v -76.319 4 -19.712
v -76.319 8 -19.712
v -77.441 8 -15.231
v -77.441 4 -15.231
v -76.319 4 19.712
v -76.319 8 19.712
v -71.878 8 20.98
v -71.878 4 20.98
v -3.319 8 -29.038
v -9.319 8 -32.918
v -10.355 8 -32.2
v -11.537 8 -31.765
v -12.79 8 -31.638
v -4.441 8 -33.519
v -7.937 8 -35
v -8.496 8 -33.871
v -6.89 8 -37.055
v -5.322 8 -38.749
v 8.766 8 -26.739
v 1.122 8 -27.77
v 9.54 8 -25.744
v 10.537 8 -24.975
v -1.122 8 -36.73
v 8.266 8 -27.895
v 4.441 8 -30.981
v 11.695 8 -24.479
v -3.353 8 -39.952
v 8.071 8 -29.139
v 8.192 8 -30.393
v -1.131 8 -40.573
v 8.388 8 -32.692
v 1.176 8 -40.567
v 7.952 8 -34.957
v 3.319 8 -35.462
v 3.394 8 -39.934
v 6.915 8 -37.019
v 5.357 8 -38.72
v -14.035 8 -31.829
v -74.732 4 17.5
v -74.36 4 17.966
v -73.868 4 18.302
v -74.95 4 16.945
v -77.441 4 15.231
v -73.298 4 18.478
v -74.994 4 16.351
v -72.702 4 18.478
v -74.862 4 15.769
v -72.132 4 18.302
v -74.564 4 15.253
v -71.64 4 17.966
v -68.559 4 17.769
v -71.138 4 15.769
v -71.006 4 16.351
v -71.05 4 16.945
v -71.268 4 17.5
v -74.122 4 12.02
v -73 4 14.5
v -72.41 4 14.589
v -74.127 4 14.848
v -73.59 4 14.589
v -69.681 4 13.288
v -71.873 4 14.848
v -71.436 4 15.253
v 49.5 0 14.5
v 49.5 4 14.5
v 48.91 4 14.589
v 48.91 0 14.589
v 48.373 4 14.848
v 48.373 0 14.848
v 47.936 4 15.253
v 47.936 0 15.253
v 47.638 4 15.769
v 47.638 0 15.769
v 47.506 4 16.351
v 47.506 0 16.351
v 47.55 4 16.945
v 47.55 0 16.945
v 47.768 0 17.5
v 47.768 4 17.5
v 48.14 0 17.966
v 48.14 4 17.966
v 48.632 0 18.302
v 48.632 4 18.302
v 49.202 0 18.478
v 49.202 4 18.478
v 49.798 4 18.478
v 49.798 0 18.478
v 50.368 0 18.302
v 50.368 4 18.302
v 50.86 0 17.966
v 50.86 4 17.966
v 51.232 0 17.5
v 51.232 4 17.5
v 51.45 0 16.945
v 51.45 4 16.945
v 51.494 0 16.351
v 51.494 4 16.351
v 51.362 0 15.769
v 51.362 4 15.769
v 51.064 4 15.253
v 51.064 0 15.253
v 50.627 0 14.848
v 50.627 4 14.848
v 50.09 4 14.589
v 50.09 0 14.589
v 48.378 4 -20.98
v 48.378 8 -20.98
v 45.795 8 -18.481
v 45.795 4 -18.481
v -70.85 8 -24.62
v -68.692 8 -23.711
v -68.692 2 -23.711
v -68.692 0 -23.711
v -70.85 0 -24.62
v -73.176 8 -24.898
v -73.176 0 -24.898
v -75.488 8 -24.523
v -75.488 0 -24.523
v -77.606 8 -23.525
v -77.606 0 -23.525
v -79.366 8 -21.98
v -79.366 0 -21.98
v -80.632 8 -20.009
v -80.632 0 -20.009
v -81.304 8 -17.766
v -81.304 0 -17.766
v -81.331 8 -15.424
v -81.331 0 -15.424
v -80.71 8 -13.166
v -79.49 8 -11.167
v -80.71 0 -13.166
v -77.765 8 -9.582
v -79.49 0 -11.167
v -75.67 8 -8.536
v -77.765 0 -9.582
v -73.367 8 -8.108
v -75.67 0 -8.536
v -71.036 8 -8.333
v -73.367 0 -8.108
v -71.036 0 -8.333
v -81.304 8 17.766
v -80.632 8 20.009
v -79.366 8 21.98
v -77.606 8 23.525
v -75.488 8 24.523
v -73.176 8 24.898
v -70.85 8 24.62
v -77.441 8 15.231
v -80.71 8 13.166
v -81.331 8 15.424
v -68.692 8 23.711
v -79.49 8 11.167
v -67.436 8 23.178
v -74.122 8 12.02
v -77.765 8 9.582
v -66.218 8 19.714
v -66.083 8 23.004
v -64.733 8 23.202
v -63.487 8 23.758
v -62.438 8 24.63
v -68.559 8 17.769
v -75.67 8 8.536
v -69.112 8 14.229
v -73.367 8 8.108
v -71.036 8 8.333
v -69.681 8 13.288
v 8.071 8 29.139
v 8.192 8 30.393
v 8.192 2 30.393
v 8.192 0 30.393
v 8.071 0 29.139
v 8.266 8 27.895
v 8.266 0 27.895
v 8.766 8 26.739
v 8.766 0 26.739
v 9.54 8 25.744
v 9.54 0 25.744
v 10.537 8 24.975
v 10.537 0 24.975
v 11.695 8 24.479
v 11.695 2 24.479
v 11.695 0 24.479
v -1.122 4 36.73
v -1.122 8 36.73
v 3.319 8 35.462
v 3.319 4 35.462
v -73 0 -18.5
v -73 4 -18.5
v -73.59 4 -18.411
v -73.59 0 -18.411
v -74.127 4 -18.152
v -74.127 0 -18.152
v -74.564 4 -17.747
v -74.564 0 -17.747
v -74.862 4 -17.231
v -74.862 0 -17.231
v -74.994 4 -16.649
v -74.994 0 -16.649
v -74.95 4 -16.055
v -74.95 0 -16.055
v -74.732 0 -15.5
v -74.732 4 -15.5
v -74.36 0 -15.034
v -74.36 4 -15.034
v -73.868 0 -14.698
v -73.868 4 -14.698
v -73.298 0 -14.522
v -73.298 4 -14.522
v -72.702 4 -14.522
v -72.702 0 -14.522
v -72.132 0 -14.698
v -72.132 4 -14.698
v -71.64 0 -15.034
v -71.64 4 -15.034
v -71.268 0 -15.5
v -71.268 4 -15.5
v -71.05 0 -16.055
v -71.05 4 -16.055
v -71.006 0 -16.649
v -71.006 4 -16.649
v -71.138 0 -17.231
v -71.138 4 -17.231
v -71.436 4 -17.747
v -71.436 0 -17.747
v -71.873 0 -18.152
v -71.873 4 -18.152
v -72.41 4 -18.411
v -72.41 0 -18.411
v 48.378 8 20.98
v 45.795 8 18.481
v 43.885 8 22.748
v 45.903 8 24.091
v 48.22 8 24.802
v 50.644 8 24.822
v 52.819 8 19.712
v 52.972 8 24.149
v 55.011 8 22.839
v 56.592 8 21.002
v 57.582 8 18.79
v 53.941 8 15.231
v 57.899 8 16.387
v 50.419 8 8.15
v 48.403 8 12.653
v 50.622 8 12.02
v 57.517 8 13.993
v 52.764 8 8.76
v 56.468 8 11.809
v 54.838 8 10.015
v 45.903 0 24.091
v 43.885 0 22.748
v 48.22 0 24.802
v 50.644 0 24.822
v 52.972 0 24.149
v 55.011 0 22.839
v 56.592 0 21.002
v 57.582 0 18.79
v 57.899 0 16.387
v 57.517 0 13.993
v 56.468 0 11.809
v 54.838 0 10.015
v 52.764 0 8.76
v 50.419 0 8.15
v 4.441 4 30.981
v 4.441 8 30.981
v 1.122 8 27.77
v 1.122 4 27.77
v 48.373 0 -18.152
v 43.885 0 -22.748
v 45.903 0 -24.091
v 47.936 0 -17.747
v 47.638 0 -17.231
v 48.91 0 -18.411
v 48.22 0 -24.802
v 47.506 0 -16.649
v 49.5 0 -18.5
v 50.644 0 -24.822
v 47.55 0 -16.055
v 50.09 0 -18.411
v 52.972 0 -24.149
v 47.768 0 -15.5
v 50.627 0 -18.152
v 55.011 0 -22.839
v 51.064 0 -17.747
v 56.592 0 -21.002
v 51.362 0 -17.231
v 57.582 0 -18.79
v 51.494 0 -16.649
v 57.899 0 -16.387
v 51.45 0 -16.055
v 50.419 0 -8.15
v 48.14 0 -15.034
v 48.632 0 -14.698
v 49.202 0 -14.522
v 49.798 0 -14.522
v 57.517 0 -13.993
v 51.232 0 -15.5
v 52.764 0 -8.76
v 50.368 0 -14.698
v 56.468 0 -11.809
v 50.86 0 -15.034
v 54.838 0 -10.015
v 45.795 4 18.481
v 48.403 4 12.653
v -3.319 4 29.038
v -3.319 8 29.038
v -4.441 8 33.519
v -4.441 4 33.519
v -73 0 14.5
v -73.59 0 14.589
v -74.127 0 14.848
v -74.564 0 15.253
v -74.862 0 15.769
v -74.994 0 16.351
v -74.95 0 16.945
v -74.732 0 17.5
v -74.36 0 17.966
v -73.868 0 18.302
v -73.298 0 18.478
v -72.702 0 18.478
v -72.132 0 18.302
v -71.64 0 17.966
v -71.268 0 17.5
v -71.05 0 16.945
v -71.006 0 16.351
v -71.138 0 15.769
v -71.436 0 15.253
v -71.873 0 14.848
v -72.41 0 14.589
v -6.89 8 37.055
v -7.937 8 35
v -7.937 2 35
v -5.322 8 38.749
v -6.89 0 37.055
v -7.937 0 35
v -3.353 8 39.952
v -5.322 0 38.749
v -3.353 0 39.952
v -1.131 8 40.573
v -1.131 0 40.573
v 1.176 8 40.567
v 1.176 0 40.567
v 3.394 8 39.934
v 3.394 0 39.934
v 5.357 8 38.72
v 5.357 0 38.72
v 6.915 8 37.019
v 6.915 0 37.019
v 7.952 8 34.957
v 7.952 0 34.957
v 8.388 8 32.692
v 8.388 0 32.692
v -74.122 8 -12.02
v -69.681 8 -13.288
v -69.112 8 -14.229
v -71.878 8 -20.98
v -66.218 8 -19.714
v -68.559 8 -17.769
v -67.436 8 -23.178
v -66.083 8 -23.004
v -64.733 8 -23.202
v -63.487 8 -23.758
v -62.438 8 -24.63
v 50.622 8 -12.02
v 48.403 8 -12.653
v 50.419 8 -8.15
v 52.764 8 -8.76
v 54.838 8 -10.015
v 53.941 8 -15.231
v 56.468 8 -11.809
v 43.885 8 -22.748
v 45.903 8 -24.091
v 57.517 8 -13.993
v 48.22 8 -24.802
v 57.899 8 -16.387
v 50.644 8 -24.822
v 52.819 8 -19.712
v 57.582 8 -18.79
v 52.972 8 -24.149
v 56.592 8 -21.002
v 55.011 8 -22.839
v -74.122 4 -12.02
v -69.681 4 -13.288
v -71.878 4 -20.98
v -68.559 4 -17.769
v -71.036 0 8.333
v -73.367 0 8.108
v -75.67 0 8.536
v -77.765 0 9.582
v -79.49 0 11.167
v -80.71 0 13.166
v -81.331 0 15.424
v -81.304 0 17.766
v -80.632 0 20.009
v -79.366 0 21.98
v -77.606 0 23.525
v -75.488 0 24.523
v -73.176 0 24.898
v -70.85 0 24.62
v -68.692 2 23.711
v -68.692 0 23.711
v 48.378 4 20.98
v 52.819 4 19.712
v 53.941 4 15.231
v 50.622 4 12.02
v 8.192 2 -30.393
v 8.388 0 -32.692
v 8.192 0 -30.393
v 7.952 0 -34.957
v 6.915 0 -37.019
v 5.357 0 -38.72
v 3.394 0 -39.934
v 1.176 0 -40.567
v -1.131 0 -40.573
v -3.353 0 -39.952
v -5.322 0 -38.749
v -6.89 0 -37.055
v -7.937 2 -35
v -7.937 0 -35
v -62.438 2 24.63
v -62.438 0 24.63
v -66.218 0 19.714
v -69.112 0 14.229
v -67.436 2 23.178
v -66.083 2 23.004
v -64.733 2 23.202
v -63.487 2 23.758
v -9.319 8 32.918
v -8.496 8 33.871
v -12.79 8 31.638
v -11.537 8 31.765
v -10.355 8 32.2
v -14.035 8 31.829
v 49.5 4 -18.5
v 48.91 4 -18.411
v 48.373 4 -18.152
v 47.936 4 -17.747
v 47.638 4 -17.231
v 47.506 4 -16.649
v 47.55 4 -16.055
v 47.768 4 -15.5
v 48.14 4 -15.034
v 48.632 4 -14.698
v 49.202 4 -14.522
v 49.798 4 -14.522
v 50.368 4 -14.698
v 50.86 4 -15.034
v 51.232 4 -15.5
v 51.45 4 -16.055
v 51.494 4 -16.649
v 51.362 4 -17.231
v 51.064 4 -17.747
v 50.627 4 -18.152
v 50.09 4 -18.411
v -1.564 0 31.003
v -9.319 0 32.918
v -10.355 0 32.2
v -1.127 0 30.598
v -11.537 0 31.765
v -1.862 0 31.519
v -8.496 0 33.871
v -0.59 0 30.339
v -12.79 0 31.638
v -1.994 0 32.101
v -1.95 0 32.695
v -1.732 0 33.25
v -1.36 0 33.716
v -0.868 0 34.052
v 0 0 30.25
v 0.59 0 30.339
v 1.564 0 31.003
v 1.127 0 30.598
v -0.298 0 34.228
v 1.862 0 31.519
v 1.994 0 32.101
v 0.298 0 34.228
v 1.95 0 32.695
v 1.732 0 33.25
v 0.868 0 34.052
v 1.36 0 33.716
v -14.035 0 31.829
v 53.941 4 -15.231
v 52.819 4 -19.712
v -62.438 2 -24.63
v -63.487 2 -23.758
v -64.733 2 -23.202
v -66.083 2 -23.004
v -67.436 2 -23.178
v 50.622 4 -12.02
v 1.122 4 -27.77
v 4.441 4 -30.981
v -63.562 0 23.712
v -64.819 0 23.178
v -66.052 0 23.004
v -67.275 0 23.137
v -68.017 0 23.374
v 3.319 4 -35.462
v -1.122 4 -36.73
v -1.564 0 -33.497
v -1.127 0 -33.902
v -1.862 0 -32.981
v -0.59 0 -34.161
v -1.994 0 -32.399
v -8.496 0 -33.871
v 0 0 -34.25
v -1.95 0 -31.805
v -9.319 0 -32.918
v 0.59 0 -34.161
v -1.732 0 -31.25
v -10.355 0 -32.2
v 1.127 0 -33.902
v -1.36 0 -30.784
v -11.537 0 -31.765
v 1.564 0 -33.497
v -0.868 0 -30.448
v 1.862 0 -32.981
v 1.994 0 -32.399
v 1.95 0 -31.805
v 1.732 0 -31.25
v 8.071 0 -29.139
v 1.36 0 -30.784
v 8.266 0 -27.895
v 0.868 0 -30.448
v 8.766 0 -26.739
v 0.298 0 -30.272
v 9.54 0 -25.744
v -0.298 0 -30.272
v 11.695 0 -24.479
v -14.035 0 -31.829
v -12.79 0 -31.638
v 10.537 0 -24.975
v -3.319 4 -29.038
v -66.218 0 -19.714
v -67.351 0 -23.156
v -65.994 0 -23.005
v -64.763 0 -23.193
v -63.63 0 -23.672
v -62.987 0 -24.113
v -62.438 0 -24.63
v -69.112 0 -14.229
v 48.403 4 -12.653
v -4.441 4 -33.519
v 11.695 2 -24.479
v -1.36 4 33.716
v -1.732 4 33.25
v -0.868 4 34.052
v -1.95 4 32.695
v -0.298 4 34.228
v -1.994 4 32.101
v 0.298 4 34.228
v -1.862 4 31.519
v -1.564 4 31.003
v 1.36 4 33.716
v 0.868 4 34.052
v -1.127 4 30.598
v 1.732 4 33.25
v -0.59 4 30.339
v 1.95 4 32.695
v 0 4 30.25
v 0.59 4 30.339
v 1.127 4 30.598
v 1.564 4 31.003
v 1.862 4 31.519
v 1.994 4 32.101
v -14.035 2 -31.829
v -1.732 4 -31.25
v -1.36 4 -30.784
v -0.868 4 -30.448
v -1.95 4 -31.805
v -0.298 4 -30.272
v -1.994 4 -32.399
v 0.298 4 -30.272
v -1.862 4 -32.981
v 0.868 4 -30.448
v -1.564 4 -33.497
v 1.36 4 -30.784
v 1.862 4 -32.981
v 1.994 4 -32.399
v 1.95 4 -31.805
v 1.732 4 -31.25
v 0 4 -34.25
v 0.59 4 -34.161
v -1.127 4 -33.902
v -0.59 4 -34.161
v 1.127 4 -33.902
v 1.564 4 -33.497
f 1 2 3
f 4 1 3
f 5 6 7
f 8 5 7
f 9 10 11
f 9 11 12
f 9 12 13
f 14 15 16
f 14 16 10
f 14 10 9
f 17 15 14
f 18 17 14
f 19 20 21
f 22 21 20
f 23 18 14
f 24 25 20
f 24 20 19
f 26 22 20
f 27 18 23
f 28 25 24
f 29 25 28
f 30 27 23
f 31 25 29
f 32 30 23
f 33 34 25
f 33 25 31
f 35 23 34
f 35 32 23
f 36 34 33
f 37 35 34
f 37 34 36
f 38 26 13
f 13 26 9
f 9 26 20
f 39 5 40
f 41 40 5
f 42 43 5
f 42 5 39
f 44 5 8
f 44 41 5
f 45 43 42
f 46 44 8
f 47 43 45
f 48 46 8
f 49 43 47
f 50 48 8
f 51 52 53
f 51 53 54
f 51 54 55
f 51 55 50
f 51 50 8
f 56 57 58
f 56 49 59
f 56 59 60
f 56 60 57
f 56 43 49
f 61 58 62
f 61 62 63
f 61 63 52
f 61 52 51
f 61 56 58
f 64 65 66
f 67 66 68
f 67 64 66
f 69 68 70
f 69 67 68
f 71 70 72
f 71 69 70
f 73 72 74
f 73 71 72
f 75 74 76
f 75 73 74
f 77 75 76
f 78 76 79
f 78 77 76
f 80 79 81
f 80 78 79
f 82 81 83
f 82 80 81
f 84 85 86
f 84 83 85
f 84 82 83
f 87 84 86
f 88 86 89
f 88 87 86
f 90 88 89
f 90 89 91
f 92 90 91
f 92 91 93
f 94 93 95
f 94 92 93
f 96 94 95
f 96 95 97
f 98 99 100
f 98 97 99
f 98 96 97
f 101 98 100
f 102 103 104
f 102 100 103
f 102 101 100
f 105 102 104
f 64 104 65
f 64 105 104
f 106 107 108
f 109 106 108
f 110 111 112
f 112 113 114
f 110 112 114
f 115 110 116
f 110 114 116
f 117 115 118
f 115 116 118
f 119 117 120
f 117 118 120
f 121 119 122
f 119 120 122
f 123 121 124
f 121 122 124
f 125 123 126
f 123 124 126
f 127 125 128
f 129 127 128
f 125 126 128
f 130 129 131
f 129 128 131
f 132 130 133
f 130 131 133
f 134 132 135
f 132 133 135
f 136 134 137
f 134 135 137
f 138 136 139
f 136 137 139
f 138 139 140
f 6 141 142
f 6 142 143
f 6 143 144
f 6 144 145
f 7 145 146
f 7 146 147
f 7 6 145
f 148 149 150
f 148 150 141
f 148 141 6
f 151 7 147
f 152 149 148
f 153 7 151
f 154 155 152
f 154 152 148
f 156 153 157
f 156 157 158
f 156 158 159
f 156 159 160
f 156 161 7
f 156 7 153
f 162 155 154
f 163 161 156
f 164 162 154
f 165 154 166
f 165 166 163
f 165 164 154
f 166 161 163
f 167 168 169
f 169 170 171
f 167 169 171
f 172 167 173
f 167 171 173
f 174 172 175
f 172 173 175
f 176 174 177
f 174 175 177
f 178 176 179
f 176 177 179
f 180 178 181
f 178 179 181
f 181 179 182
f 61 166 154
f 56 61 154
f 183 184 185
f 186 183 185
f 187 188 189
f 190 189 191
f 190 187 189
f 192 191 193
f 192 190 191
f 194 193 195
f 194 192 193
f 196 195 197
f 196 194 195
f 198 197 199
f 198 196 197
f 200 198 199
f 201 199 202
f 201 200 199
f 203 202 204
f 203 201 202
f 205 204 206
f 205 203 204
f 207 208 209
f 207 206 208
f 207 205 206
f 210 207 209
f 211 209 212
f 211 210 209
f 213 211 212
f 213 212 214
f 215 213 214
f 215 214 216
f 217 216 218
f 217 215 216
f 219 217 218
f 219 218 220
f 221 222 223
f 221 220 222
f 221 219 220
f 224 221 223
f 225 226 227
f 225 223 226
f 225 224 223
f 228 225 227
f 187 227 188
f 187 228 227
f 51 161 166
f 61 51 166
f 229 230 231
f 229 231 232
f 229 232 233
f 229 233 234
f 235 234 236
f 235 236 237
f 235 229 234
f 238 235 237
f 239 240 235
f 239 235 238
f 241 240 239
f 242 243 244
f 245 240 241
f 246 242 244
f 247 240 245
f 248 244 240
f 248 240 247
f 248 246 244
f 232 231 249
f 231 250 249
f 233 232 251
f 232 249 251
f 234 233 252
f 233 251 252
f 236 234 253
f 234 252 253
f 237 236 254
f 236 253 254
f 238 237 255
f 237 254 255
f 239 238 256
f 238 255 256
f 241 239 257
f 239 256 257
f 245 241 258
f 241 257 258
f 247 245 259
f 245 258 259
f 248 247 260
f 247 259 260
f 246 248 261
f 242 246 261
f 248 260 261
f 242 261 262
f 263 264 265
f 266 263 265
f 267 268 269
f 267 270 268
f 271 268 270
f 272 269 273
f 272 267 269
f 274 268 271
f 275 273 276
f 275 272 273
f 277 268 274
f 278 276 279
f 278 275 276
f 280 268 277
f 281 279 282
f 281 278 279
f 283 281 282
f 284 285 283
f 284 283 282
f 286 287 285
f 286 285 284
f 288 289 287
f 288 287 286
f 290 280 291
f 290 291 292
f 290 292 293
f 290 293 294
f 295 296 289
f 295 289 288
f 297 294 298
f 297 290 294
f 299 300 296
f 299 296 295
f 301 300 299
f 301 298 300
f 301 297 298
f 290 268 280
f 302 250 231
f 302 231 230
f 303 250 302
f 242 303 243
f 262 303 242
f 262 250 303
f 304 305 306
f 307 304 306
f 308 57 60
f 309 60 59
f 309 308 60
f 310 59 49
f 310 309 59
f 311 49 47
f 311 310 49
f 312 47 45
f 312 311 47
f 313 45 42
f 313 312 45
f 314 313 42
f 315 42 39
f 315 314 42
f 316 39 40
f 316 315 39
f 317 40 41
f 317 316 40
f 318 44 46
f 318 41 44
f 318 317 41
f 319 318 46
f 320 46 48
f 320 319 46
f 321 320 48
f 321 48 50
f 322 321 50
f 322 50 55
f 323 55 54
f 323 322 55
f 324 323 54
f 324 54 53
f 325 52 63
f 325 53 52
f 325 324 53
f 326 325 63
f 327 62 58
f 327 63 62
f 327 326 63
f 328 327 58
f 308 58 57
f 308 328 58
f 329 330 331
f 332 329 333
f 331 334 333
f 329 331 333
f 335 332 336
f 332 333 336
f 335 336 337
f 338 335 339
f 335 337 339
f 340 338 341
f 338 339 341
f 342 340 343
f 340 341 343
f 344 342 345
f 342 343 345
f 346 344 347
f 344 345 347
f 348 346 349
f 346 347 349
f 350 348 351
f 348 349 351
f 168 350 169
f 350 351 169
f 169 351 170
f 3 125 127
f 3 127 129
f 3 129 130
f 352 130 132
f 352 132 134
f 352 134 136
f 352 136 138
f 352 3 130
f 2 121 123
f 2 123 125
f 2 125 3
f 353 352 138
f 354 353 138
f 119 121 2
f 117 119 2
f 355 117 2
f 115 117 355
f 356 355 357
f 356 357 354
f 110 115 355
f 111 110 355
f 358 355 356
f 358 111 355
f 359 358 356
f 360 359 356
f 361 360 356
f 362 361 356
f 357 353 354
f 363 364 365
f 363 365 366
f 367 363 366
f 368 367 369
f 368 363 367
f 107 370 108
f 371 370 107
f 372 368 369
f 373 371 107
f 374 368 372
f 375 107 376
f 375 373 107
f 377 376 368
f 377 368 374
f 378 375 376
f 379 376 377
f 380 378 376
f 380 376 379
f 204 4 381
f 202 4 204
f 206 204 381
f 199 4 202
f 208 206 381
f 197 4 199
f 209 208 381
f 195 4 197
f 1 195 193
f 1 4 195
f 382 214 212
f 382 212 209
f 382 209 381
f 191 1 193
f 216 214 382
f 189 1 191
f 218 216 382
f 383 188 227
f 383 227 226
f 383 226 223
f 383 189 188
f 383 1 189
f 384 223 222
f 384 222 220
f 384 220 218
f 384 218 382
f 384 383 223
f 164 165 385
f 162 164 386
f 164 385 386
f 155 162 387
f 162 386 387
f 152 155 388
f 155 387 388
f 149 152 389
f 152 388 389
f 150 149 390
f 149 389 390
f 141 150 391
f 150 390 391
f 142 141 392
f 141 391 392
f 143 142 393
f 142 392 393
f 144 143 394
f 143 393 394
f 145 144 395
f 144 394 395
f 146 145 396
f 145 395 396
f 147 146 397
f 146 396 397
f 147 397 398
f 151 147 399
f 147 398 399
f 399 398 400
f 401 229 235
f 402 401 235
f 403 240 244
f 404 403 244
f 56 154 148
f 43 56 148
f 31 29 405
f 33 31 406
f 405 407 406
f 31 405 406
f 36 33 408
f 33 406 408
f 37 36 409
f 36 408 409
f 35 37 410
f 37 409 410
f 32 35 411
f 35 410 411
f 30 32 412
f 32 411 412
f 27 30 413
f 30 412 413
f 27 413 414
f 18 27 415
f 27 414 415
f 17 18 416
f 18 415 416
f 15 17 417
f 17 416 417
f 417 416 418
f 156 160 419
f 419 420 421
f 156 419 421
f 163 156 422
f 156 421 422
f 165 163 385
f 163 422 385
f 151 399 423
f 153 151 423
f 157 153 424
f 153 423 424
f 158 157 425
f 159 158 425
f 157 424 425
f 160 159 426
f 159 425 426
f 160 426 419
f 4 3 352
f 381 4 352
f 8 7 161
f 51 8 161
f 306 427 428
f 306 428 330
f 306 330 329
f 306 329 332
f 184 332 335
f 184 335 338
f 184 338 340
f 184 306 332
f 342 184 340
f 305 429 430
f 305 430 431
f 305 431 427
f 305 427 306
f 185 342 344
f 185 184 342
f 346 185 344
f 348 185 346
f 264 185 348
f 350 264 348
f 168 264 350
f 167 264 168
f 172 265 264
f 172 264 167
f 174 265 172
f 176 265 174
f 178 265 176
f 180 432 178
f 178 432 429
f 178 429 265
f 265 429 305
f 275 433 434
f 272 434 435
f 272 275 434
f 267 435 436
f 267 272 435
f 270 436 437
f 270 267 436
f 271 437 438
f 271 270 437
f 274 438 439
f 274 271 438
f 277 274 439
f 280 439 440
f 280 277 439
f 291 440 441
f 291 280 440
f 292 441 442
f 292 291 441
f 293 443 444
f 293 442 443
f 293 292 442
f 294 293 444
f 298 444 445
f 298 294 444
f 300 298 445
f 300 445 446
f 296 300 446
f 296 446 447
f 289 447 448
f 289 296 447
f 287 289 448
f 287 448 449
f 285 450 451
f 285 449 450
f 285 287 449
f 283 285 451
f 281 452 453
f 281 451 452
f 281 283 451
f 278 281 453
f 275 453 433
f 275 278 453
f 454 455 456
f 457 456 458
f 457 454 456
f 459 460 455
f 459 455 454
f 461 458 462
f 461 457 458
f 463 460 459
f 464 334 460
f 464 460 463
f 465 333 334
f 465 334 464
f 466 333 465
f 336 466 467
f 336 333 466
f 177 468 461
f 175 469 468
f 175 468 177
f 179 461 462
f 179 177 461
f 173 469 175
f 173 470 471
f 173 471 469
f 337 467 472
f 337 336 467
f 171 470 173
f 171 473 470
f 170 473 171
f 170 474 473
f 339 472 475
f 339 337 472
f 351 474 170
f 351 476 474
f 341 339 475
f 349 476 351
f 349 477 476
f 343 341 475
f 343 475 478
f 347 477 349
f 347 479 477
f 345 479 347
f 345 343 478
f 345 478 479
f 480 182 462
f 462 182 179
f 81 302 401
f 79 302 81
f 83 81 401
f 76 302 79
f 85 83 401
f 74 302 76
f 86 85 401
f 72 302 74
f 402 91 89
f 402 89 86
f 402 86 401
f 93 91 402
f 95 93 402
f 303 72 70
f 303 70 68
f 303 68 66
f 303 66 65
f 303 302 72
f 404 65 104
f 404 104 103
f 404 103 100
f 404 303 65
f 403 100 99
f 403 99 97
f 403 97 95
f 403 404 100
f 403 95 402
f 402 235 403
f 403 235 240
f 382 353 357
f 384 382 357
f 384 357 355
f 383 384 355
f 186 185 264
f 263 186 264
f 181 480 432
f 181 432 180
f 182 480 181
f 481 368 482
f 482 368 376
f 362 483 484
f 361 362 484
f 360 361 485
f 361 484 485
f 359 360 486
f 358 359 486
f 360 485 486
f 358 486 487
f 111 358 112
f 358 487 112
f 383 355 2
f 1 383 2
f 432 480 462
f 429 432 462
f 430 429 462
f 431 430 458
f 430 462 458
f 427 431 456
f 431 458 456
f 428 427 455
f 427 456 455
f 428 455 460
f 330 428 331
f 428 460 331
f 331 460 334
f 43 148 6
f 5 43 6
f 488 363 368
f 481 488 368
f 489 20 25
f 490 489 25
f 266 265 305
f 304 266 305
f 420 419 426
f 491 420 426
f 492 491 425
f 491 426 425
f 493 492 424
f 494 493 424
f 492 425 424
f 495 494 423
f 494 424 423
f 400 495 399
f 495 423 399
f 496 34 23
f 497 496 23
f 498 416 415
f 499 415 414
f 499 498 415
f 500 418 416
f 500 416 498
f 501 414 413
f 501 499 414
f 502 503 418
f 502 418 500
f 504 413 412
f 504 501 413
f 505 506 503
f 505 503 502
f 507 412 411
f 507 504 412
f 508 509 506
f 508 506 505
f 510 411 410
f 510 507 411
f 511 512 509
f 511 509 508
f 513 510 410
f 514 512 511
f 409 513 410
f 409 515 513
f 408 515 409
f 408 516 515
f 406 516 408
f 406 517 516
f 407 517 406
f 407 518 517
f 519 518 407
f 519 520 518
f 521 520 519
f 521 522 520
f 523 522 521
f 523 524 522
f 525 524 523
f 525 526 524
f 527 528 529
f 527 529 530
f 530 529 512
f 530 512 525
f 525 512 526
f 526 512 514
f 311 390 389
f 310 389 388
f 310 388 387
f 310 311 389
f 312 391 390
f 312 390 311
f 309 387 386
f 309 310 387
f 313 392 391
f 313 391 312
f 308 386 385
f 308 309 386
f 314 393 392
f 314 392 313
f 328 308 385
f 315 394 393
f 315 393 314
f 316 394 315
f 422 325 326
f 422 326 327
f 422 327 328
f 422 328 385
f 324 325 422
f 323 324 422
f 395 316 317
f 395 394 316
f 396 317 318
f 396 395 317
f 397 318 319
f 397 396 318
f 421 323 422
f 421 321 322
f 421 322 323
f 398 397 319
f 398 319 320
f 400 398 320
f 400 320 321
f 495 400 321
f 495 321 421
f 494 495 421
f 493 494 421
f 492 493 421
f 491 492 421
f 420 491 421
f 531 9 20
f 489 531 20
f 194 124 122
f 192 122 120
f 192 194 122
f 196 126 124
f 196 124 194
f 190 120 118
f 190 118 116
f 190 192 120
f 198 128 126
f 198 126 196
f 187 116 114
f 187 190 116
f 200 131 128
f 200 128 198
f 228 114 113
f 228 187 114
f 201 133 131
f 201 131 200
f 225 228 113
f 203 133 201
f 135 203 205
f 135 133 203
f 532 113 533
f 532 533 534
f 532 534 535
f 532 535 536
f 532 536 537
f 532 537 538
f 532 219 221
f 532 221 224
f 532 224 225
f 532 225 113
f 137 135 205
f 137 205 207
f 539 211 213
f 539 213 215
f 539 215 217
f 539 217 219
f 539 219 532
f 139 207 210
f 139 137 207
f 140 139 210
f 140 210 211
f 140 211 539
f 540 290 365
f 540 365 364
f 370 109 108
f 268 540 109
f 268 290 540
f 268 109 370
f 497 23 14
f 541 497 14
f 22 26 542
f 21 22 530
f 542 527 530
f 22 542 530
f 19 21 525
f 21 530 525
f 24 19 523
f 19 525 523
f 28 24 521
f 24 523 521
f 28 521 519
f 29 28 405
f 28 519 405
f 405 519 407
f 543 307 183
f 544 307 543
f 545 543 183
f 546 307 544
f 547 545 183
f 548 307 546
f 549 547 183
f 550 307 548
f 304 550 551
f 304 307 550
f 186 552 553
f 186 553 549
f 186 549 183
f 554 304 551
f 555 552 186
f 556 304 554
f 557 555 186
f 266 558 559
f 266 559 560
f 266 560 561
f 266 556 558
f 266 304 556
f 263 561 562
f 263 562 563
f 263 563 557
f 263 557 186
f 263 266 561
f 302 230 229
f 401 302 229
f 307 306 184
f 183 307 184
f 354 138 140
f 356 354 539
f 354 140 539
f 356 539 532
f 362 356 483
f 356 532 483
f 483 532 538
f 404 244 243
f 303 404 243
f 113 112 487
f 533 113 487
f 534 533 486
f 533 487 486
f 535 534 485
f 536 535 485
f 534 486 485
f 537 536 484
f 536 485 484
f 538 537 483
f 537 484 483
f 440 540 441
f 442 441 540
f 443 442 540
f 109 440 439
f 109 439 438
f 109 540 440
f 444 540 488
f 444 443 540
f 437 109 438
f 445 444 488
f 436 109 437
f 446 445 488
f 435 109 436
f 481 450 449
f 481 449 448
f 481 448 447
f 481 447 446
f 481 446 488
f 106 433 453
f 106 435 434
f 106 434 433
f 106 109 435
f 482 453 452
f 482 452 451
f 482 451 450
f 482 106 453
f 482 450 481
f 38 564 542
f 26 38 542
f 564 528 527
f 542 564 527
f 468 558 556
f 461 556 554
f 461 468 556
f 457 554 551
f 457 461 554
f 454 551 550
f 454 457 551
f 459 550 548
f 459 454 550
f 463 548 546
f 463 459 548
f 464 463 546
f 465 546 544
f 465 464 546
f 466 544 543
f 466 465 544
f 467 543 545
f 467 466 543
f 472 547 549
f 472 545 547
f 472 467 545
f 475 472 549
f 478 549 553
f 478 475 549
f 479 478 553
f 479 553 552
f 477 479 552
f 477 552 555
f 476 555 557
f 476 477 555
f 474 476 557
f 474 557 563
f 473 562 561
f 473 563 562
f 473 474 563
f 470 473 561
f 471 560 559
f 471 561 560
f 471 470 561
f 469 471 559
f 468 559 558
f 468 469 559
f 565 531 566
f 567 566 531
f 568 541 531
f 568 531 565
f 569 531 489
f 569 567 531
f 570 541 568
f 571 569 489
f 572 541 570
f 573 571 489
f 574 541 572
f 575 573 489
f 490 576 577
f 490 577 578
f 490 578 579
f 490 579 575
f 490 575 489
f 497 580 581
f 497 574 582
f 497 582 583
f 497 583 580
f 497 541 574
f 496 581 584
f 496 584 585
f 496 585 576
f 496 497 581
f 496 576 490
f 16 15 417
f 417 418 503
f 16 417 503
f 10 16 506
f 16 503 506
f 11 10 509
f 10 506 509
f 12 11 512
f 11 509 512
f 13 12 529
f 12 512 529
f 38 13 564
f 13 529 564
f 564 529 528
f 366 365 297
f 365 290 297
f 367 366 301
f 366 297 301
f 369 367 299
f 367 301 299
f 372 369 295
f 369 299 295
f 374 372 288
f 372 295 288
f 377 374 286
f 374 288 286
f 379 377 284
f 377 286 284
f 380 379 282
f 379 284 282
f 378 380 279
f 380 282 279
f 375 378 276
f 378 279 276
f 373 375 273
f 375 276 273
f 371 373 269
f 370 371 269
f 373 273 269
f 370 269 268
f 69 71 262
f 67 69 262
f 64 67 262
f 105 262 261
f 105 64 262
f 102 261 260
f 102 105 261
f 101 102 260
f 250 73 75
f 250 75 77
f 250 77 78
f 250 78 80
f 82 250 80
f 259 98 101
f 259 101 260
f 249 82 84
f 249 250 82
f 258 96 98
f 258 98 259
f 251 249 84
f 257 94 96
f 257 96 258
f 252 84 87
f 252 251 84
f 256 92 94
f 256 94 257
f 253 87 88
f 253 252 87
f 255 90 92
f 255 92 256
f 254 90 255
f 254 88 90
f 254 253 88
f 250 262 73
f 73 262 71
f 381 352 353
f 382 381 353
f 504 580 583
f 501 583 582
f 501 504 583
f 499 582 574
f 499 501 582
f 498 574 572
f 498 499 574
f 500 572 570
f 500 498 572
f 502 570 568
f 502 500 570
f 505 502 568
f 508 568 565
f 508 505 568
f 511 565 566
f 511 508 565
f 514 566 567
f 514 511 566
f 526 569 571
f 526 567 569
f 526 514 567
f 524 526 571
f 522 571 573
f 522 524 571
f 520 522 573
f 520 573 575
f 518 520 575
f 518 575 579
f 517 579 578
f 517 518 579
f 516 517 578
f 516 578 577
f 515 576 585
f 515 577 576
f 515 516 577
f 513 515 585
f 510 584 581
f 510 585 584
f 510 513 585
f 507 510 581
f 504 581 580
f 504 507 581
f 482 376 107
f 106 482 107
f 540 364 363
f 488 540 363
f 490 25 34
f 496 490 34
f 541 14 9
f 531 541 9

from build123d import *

# Parameters (mm, degrees)
SKETCH1_W               = 200
SKETCH1_H               = 150
SKETCH1_R               = 6
SKETCH1_R_2             = 13.5
SKETCH1_R_3             = 2
SKETCH1_R_4             = 2.5
BOSS_EXTRUDE1_DEPTH     = 4
SKETCH3_W               = 200
SKETCH3_H               = 150
BOSS_EXTRUDE2_DEPTH     = 8.25
SKETCH6_R               = 5.4
CUT_EXTRUDE2_DEPTH      = 8.25
FILLET1_R               = 2.5
FILLET2_R               = 5
SKETCH2_R               = 4.4
SKETCH2_R_2             = 5.4
CUT_EXTRUDE1_DEPTH      = 2
CUT_EXTRUDE3_DEPTH      = 126.598815828
CUT_EXTRUDE3_DEPTH_BACK = 126.598815828
SKETCH8_R               = 2
CUT_EXTRUDE6_DEPTH      = 126.598815818
CUT_EXTRUDE6_DEPTH_BACK = 126.598815818
SKETCH13_OUTSIDE_W      = 252.06
SKETCH13_OUTSIDE_H      = 202.06
FILLET4_R               = 5
CUT_EXTRUDE7_START      = -10.25
CUT_EXTRUDE7_DEPTH      = 10.25
SKETCH17_R              = 2
BOSS_EXTRUDE3_DEPTH     = 2
SKETCH18_R              = 13.5
SKETCH18_R_2            = 2
SKETCH18_R_3            = 2.5
SKETCH18_R_4            = 6
BOSS_EXTRUDE4_DEPTH     = 6
CUT_EXTRUDE8_DEPTH      = 92.336643939
CUT_EXTRUDE8_DEPTH_BACK = 92.336643939
SKETCH19_R              = 19.5
SKETCH19_R_2            = 0.75
CUT_EXTRUDE9_DEPTH      = 4
CUT_EXTRUDE10_DEPTH     = 4
SKETCH22_OUTSIDE_W      = 173.598
SKETCH22_OUTSIDE_H      = 115.598
CUT_EXTRUDE12_DEPTH     = 10


with BuildPart() as part:
    # Sketch1 → Boss-Extrude1 (new body)
    with BuildSketch(Plane(origin=(0, 0, 0), x_dir=(1, 0, 0), z_dir=(0, 1, 0))):
        Rectangle(SKETCH1_W, SKETCH1_H)
        with Locations(Location((35.5, 0, 0), (0, 0, 270))):
            Circle(SKETCH1_R, mode=Mode.SUBTRACT)
        with Locations(Location((-35.5, 0, 0), (0, 0, 270))):
            Circle(SKETCH1_R_2, mode=Mode.SUBTRACT)
        with Locations(Location((-60.5, 0, 0), (0, 0, 270))):
            Circle(SKETCH1_R_3, mode=Mode.SUBTRACT)
        with Locations(Location((-35.5, 25, 0), (0, 0, 270))):
            Circle(SKETCH1_R_3, mode=Mode.SUBTRACT)
        with Locations(Location((-10.5, 0, 0), (0, 0, 270))):
            Circle(SKETCH1_R_3, mode=Mode.SUBTRACT)
        with Locations(Location((-35.5, -25, 0), (0, 0, 270))):
            Circle(SKETCH1_R_3, mode=Mode.SUBTRACT)
        with Locations(Location((35.5, 18.5, 0), (0, 0, 270))):
            Circle(SKETCH1_R_4, mode=Mode.SUBTRACT)
        with Locations(Location((35.5, -18.5, 0), (0, 0, 90))):
            Circle(SKETCH1_R_4, mode=Mode.SUBTRACT)
        Polygon((4.517711304, -15.136418767), (0.159242352, 0.258507293), (4.681501882, 1.538807548), (9.039970835, -13.856118512), (9.584779454, -15.78048427), (5.062519924, -17.060784524), align=None, mode=Mode.SUBTRACT)
    extrude(amount=BOSS_EXTRUDE1_DEPTH)

    # Sketch3 → Boss-Extrude2 (add)
    with BuildSketch(Plane(origin=(0, 4, 0), x_dir=(1, 0, 0), z_dir=(0, 1, 0))):
        Rectangle(SKETCH3_W, SKETCH3_H)
        with BuildLine():
            Line((-26.573943662, 31.250208291), (39.070422535, 12.500083317))
            ThreePointArc((39.070422535, 12.500083317), (48.5, 0), (39.070422535, -12.500083317))
            Line((39.070422535, -12.500083317), (-26.573943662, -31.250208291))
            ThreePointArc((-26.573943662, -31.250208291), (-68, 0), (-26.573943662, 31.250208291))
        make_face(mode=Mode.SUBTRACT)
    extrude(amount=BOSS_EXTRUDE2_DEPTH)

    # Sketch6 → Cut-Extrude2 (cut)
    with BuildSketch(Plane(origin=(0, 12.25, 0), x_dir=(1, 0, 0), z_dir=(0, 1, 0))):
        with Locations((35.5, 18.5)):
            Circle(SKETCH6_R)
        with Locations((35.5, -18.5)):
            Circle(SKETCH6_R)
    extrude(amount=-CUT_EXTRUDE2_DEPTH, mode=Mode.SUBTRACT)

    # Fillet1
    # the kernel refuses this fillet: 2.5 mm, written as the material it adds along each edge
    with BuildSketch(Plane(origin=(9.584779454, 0, 15.78048427), x_dir=(-0.9621828787440704, 0, 0.2724043095323078), z_dir=(0, 1, 0)), Plane(origin=(5.062519924, 0, 17.060784524), x_dir=(-0.2724043095323296, 0, -0.9621828787440644), z_dir=(0, 1, 0)), Plane(origin=(4.681501882, 0, -1.538807548), x_dir=(0.2724043095323091, 0, 0.96218287874407), z_dir=(0, 1, 0))) as fillet1_piece_1:
        with BuildLine():
            CenterArc((FILLET1_R, -FILLET1_R), FILLET1_R, 90, 90)
            Line((0, -FILLET1_R), (0, 0))
            Line((0, 0), (FILLET1_R, 0))
        make_face()
    extrude(amount=4)
    with BuildSketch(Plane(origin=(0.159242352, 0, -0.258507293), x_dir=(0.272404309532306, 0, 0.962182878744071), z_dir=(0, 1, 0))) as fillet1_piece_2:
        with BuildLine():
            CenterArc((FILLET1_R, FILLET1_R), FILLET1_R, 180, 90)
            Line((0, FILLET1_R), (0, 0))
            Line((0, 0), (FILLET1_R, 0))
        make_face()
    extrude(amount=4)

    # Fillet2
    fillet2_edges = [part.edges().sort_by_distance(p)[0] for p in [
        (31.784909874, 8.125, 14.581058133),
        (36.584743308, 8.125, 13.210072594),
        (36.584743308, 8.125, -13.210072594),
        (31.784909874, 8.125, -14.581058133),
    ]]
    fillet(fillet2_edges, radius=FILLET2_R)

    # Sketch2 → Cut-Extrude1 (cut)
    with BuildSketch(Plane(origin=(0, 4, 0), x_dir=(1, 0, 0), z_dir=(0, 1, 0))):
        with Locations(Location((-35.5, 25, 0), (0, 0, 270))):
            Circle(SKETCH2_R)
        with Locations(Location((-10.5, 0, 0), (0, 0, 270))):
            Circle(SKETCH2_R)
        with Locations(Location((-35.5, -25, 0), (0, 0, 270))):
            Circle(SKETCH2_R)
        with Locations(Location((-60.5, 0, 0), (0, 0, 270))):
            Circle(SKETCH2_R)
        with Locations(Location((35.5, 18.5, 0), (0, 0, 270))):
            Circle(SKETCH2_R_2)
        with Locations(Location((35.5, -18.5, 0), (0, 0, 197.105868404))):
            Circle(SKETCH2_R_2)
    extrude(amount=-CUT_EXTRUDE1_DEPTH, mode=Mode.SUBTRACT)

    # Sketch8 → Cut-Extrude3 (cut, two sides: drawn at the far end of the back side and taken through both)
    with BuildSketch(Plane.XZ.offset(-CUT_EXTRUDE3_DEPTH_BACK)):
        with Locations(Location((49.5, 16.5, 0), (0, 0, 270))):
            Circle(SKETCH8_R)
        with Locations(Location((-73, 16.5, 0), (0, 0, 270))):
            Circle(SKETCH8_R)
        with Locations(Location((0, 32.25, 0), (0, 0, 270))):
            Circle(SKETCH8_R)
        with Locations(Location((-73, -16.5, 0), (0, 0, 270))):
            Circle(SKETCH8_R)
        with Locations(Location((0, -32.25, 0), (0, 0, 270))):
            Circle(SKETCH8_R)
        with Locations(Location((49.5, -16.5, 0), (0, 0, 270))):
            Circle(SKETCH8_R)
    extrude(amount=CUT_EXTRUDE3_DEPTH + CUT_EXTRUDE3_DEPTH_BACK, mode=Mode.SUBTRACT)

    # Sketch13 outside → Cut-Extrude6 (cut, two sides: drawn at the far end of the back side and taken through both)
    with BuildSketch(Plane(origin=(0, 12.25, 0), x_dir=(1, 0, 0), z_dir=(0, 1, 0)).offset(-CUT_EXTRUDE6_DEPTH_BACK)):
        Rectangle(SKETCH13_OUTSIDE_W, SKETCH13_OUTSIDE_H)
        with BuildLine():
            Line((-8.131291348, 30.142370761), (-25.475352113, 35.096387773))
            ThreePointArc((-25.475352113, 35.096387773), (-47.910899113, 34.325203324), (-65.651791262, 20.569868344))
            ThreePointArc((-65.651791262, 20.569868344), (-80.688646272, 19.88300436), (-71.036099712, 8.332803684))
            ThreePointArc((-71.036099712, 8.332803684), (-72, 0), (-71.036099712, -8.332803684))
            ThreePointArc((-71.036099712, -8.332803684), (-80.688646272, -19.88300436), (-65.651791262, -20.569868344))
            ThreePointArc((-65.651791262, -20.569868344), (-47.910899113, -34.325203324), (-25.475352113, -35.096387773))
            Line((-25.475352113, -35.096387773), (-8.131291348, -30.142370761))
            ThreePointArc((-8.131291348, -30.142370761), (2.307042254, -40.326976912), (5.791389082, -26.165609111))
            Line((5.791389082, -26.165609111), (25.285418022, -20.597492606))
            ThreePointArc((25.285418022, -20.597492606), (26.036864948, -20.680025145), (26.515828803, -21.264899257))
            ThreePointArc((26.515828803, -21.264899257), (34.700336728, -27.865924335), (43.885416553, -22.74791587))
            ThreePointArc((43.885416553, -22.74791587), (57.167099831, -19.931556524), (50.418811796, -8.150402112))
            ThreePointArc((50.418811796, -8.150402112), (52.5, 0), (50.418811796, 8.150402112))
            ThreePointArc((50.418811796, 8.150402112), (57.167099831, 19.931556524), (43.885416553, 22.74791587))
            ThreePointArc((43.885416553, 22.74791587), (34.700336728, 27.865924335), (26.515828803, 21.264899257))
            ThreePointArc((26.515828803, 21.264899257), (26.036864948, 20.680025145), (25.285418022, 20.597492606))
            Line((25.285418022, 20.597492606), (5.791389082, 26.165609111))
            ThreePointArc((5.791389082, 26.165609111), (2.307042254, 40.326976912), (-8.131291348, 30.142370761))
        make_face(mode=Mode.SUBTRACT)
    extrude(amount=CUT_EXTRUDE6_DEPTH + CUT_EXTRUDE6_DEPTH_BACK, mode=Mode.SUBTRACT)

    # Fillet4
    fillet4_edges = [part.edges().sort_by_distance(p)[0] for p in [
        (-65.651791262, 6.125, -20.569868344),
        (-8.131291348, 6.125, -30.142370761),
        (5.791389082, 6.125, -26.165609111),
        (5.791389082, 6.125, 26.165609111),
        (-8.131291348, 6.125, 30.142370761),
        (-65.651791262, 6.125, 20.569868344),
    ]]
    fillet(fillet4_edges, radius=FILLET4_R)

    # Sketch16 → Cut-Extrude7 (cut)
    with BuildSketch(Plane(origin=(0, 12.25, 0), x_dir=(1, 0, 0), z_dir=(0, 1, 0)).offset(CUT_EXTRUDE7_START)):
        with BuildLine():
            Line((-25.475352113, -35.096387773), (-14.034980843, -31.828652803))
            ThreePointArc((-14.034980843, -31.828652803), (-10.35487685, -32.200345605), (-7.937211031, -34.999669261))
            ThreePointArc((-7.937211031, -34.999669261), (2.307042254, -40.326976912), (8.192079949, -30.392629249))
            ThreePointArc((8.192079949, -30.392629249), (8.766483762, -26.738675062), (11.695078578, -24.479327069))
            Line((11.695078578, -24.479327069), (25.285418022, -20.597492606))
            ThreePointArc((25.285418022, -20.597492606), (26.036864948, -20.680025145), (26.515828803, -21.264899257))
            ThreePointArc((26.515828803, -21.264899257), (34.700336728, -27.865924335), (43.885416553, -22.74791587))
            ThreePointArc((43.885416553, -22.74791587), (57.167099831, -19.931556524), (50.418811796, -8.150402112))
            ThreePointArc((50.418811796, -8.150402112), (52.5, 0), (50.418811796, 8.150402112))
            ThreePointArc((50.418811796, 8.150402112), (57.167099831, 19.931556524), (43.885416553, 22.74791587))
            ThreePointArc((43.885416553, 22.74791587), (34.700336728, 27.865924335), (26.515828803, 21.264899257))
            ThreePointArc((26.515828803, 21.264899257), (26.036864948, 20.680025145), (25.285418022, 20.597492606))
            Line((25.285418022, 20.597492606), (11.695078578, 24.479327069))
            ThreePointArc((11.695078578, 24.479327069), (8.766483762, 26.738675062), (8.192079949, 30.392629249))
            ThreePointArc((8.192079949, 30.392629249), (2.307042254, 40.326976912), (-7.937211031, 34.999669261))
            ThreePointArc((-7.937211031, 34.999669261), (-10.35487685, 32.200345605), (-14.034980843, 31.828652803))
            Line((-14.034980843, 31.828652803), (-25.475352113, 35.096387773))
            ThreePointArc((-25.475352113, 35.096387773), (-45.44485792, 35.119080298), (-62.437574746, 24.629597374))
            ThreePointArc((-62.437574746, 24.629597374), (-65.401208588, 23.05656851), (-68.691961882, 23.711158546))
            ThreePointArc((-68.691961882, 23.711158546), (-81.304080467, 17.765799193), (-71.036099712, 8.332803684))
            ThreePointArc((-71.036099712, 8.332803684), (-72, 0), (-71.036099712, -8.332803684))
            ThreePointArc((-71.036099712, -8.332803684), (-81.304080467, -17.765799193), (-68.691961882, -23.711158546))
            ThreePointArc((-68.691961882, -23.711158546), (-65.401208588, -23.05656851), (-62.437574746, -24.629597374))
            ThreePointArc((-62.437574746, -24.629597374), (-45.44485792, -35.119080298), (-25.475352113, -35.096387773))
        make_face()
    extrude(amount=CUT_EXTRUDE7_DEPTH, mode=Mode.SUBTRACT)

    # Sketch17 → Boss-Extrude3 (add)
    with BuildSketch(Plane.XZ):
        with Locations((-10.5, 0)):
            Circle(SKETCH17_R)
        with Locations((-35.5, -25)):
            Circle(SKETCH17_R)
        with Locations((-35.5, 25)):
            Circle(SKETCH17_R)
        with Locations((-60.5, 0)):
            Circle(SKETCH17_R)
        with BuildLine():
            Line((4.38150915, 14.655327328), (0.840253126, 2.146949904))
            ThreePointArc((0.840253126, 2.146949904), (1.027633585, 0.312624087), (2.421599042, -0.894323694))
            ThreePointArc((2.421599042, -0.894323694), (4.241377267, -0.597221274), (5.362512656, 0.866649649))
            Line((5.362512656, 0.866649649), (8.90376868, 13.375027073))
            ThreePointArc((8.90376868, 13.375027073), (8.71638822, 15.209352889), (7.322422764, 16.41630067))
            ThreePointArc((7.322422764, 16.41630067), (5.502644538, 16.11919825), (4.38150915, 14.655327328))
        make_face()
    extrude(amount=-BOSS_EXTRUDE3_DEPTH)

    # Sketch18 → Boss-Extrude4 (add)
    with BuildSketch(Plane(origin=(0, 2, 0), x_dir=(1, 0, 0), z_dir=(0, 1, 0))):
        with BuildLine():
            Line((-25.475352113, -35.096387773), (-14.034980843, -31.828652803))
            ThreePointArc((-14.034980843, -31.828652803), (-10.35487685, -32.200345605), (-7.937211031, -34.999669261))
            ThreePointArc((-7.937211031, -34.999669261), (2.307042254, -40.326976912), (8.192079949, -30.392629249))
            ThreePointArc((8.192079949, -30.392629249), (8.766483762, -26.738675062), (11.695078578, -24.479327069))
            Line((11.695078578, -24.479327069), (25.285418022, -20.597492606))
            ThreePointArc((25.285418022, -20.597492606), (26.036864948, -20.680025145), (26.515828803, -21.264899257))
            ThreePointArc((26.515828803, -21.264899257), (34.700336728, -27.865924335), (43.885416553, -22.74791587))
            ThreePointArc((43.885416553, -22.74791587), (57.167099831, -19.931556524), (50.418811796, -8.150402112))
            ThreePointArc((50.418811796, -8.150402112), (52.5, 0), (50.418811796, 8.150402112))
            ThreePointArc((50.418811796, 8.150402112), (57.167099831, 19.931556524), (43.885416553, 22.74791587))
            ThreePointArc((43.885416553, 22.74791587), (34.700336728, 27.865924335), (26.515828803, 21.264899257))
            ThreePointArc((26.515828803, 21.264899257), (26.036864948, 20.680025145), (25.285418022, 20.597492606))
            Line((25.285418022, 20.597492606), (11.695078578, 24.479327069))
            ThreePointArc((11.695078578, 24.479327069), (8.766483762, 26.738675062), (8.192079949, 30.392629249))
            ThreePointArc((8.192079949, 30.392629249), (2.307042254, 40.326976912), (-7.937211031, 34.999669261))
            ThreePointArc((-7.937211031, 34.999669261), (-10.35487685, 32.200345605), (-14.034980843, 31.828652803))
            Line((-14.034980843, 31.828652803), (-25.475352113, 35.096387773))
            ThreePointArc((-25.475352113, 35.096387773), (-45.44485792, 35.119080298), (-62.437574746, 24.629597374))
            ThreePointArc((-62.437574746, 24.629597374), (-65.401208588, 23.05656851), (-68.691961882, 23.711158546))
            ThreePointArc((-68.691961882, 23.711158546), (-81.304080467, 17.765799193), (-71.036099712, 8.332803684))
            ThreePointArc((-71.036099712, 8.332803684), (-72, 0), (-71.036099712, -8.332803684))
            ThreePointArc((-71.036099712, -8.332803684), (-81.304080467, -17.765799193), (-68.691961882, -23.711158546))
            ThreePointArc((-68.691961882, -23.711158546), (-65.401208588, -23.05656851), (-62.437574746, -24.629597374))
            ThreePointArc((-62.437574746, -24.629597374), (-45.44485792, -35.119080298), (-25.475352113, -35.096387773))
        make_face()
        with Locations(Location((-35.5, 0, 0), (0, 0, 270))):
            Circle(SKETCH18_R, mode=Mode.SUBTRACT)
        with Locations(Location((0, 32.25, 0), (0, 0, 90))):
            Circle(SKETCH18_R_2, mode=Mode.SUBTRACT)
        with Locations(Location((-73, 16.5, 0), (0, 0, 90))):
            Circle(SKETCH18_R_2, mode=Mode.SUBTRACT)
        with Locations(Location((-73, -16.5, 0), (0, 0, 90))):
            Circle(SKETCH18_R_2, mode=Mode.SUBTRACT)
        with Locations(Location((0, -32.25, 0), (0, 0, 90))):
            Circle(SKETCH18_R_2, mode=Mode.SUBTRACT)
        with Locations(Location((35.5, -18.5, 0), (0, 0, 90))):
            Circle(SKETCH18_R_3, mode=Mode.SUBTRACT)
        with Locations(Location((35.5, 0, 0), (0, 0, 270))):
            Circle(SKETCH18_R_4, mode=Mode.SUBTRACT)
        with Locations(Location((49.5, -16.5, 0), (0, 0, 90))):
            Circle(SKETCH18_R_2, mode=Mode.SUBTRACT)
        with Locations(Location((35.5, 18.5, 0), (0, 0, 270))):
            Circle(SKETCH18_R_3, mode=Mode.SUBTRACT)
        with Locations(Location((49.5, 16.5, 0), (0, 0, 90))):
            Circle(SKETCH18_R_2, mode=Mode.SUBTRACT)
    extrude(amount=BOSS_EXTRUDE4_DEPTH)

    # Sketch19 → Cut-Extrude8 (cut, two sides: drawn at the far end of the back side and taken through both)
    with BuildSketch(Plane.XZ.offset(-CUT_EXTRUDE8_DEPTH_BACK)):
        with Locations(Location((-35.5, 0, 0), (0, 0, 270))):
            Circle(SKETCH19_R)
        with Locations(Location((35.5, 9.525, 0), (0, 0, 270))):
            Circle(SKETCH19_R_2)
        with Locations(Location((35.5, -9.525, 0), (0, 0, 270))):
            Circle(SKETCH19_R_2)
    extrude(amount=CUT_EXTRUDE8_DEPTH + CUT_EXTRUDE8_DEPTH_BACK, mode=Mode.SUBTRACT)

    # Sketch20 → Cut-Extrude9 (cut)
    with BuildSketch(Plane.XZ):
        Polygon((40.118802154, 18.5), (37.809401077, 22.5), (33.190598923, 22.5), (30.881197846, 18.5), (33.190598923, 14.5), (37.809401077, 14.5), align=None)
        Polygon((40.118802154, -18.5), (37.809401077, -14.5), (33.190598923, -14.5), (30.881197846, -18.5), (33.190598923, -22.5), (37.809401077, -22.5), align=None)
    extrude(amount=-CUT_EXTRUDE9_DEPTH, mode=Mode.SUBTRACT)

    # Sketch21 → Cut-Extrude10 (cut)
    with BuildSketch(Plane(origin=(0, 8, 0), x_dir=(1, 0, 0), z_dir=(0, 1, 0))):
        Polygon((-69.680815691, 13.288092645), (-68.558814481, 17.768544253), (-71.87799879, 20.980451609), (-76.319184309, 19.711907355), (-77.441185519, 15.231455747), (-74.12200121, 12.019548391), align=None)
        Polygon((-69.680815691, -13.288092645), (-74.12200121, -12.019548391), (-77.441185519, -15.231455747), (-76.319184309, -19.711907355), (-71.87799879, -20.980451609), (-68.558814481, -17.768544253), align=None)
        Polygon((4.441185519, 30.981455747), (3.319184309, 35.461907355), (-1.12200121, 36.730451609), (-4.441185519, 33.518544253), (-3.319184309, 29.038092645), (1.12200121, 27.769548391), align=None)
        Polygon((50.62200121, 12.019548391), (53.941185519, 15.231455747), (52.819184309, 19.711907355), (48.37799879, 20.980451609), (45.058814481, 17.768544253), (46.180815691, 13.288092645), align=None)
        Polygon((53.941185519, -15.231455747), (50.62200121, -12.019548391), (46.180815691, -13.288092645), (45.058814481, -17.768544253), (48.37799879, -20.980451609), (52.819184309, -19.711907355), align=None)
        Polygon((4.441185519, -30.981455747), (1.12200121, -27.769548391), (-3.319184309, -29.038092645), (-4.441185519, -33.518544253), (-1.12200121, -36.730451609), (3.319184309, -35.461907355), align=None)
    extrude(amount=-CUT_EXTRUDE10_DEPTH, mode=Mode.SUBTRACT)

    # Sketch22 outside → Cut-Extrude12 (cut)
    with BuildSketch(Plane.XZ):
        with Locations((-11.75, 0)):
            Rectangle(SKETCH22_OUTSIDE_W, SKETCH22_OUTSIDE_H)
        with BuildLine():
            Line((-14.034980843, 31.828652803), (11.695078578, 24.479327069))
            ThreePointArc((11.695078578, 24.479327069), (8.766483762, 26.738675062), (8.192079949, 30.392629249))
            ThreePointArc((8.192079949, 30.392629249), (2.307042254, 40.326976912), (-7.937211031, 34.999669261))
            ThreePointArc((-7.937211031, 34.999669261), (-10.35487685, 32.200345605), (-14.034980843, 31.828652803))
        make_face(mode=Mode.SUBTRACT)
        with BuildLine():
            Line((-14.034980843, -31.828652803), (11.695078578, -24.479327069))
            ThreePointArc((11.695078578, -24.479327069), (8.766483762, -26.738675062), (8.192079949, -30.392629249))
            ThreePointArc((8.192079949, -30.392629249), (2.307042254, -40.326976912), (-7.937211031, -34.999669261))
            ThreePointArc((-7.937211031, -34.999669261), (-10.35487685, -32.200345605), (-14.034980843, -31.828652803))
        make_face(mode=Mode.SUBTRACT)
        with BuildLine():
            Line((43.885416553, 22.74791587), (50.418811796, 8.150402112))
            ThreePointArc((50.418811796, 8.150402112), (57.167099831, 19.931556524), (43.885416553, 22.74791587))
        make_face(mode=Mode.SUBTRACT)
        with BuildLine():
            Line((50.418811796, -8.150402112), (43.885416553, -22.74791587))
            ThreePointArc((43.885416553, -22.74791587), (57.167099831, -19.931556524), (50.418811796, -8.150402112))
        make_face(mode=Mode.SUBTRACT)
        with BuildLine():
            ThreePointArc((-62.437574746, 24.629597374), (-67.78213703, 17.032722295), (-71.036099712, 8.332803684))
            ThreePointArc((-71.036099712, 8.332803684), (-81.304080467, 17.765799193), (-68.691961882, 23.711158546))
            ThreePointArc((-68.691961882, 23.711158546), (-65.401208588, 23.05656851), (-62.437574746, 24.629597374))
        make_face(mode=Mode.SUBTRACT)
        with BuildLine():
            ThreePointArc((-71.036099712, -8.332803684), (-67.78213703, -17.032722295), (-62.437574746, -24.629597374))
            ThreePointArc((-62.437574746, -24.629597374), (-65.401208588, -23.05656851), (-68.691961882, -23.711158546))
            ThreePointArc((-68.691961882, -23.711158546), (-81.304080467, -17.765799193), (-71.036099712, -8.332803684))
        make_face(mode=Mode.SUBTRACT)
    extrude(amount=-CUT_EXTRUDE12_DEPTH, mode=Mode.SUBTRACT)


with BuildPart() as cut_extrude12_piece_1:
    # of the separate pieces the step leaves, piece 1, a body of its own (cut_extrude12_pieces)
    add(part.part.solids().sort_by_distance((11.695078578, 0, 24.479327069))[0])


with BuildPart() as cut_extrude12_piece_2:
    # of the separate pieces the step leaves, piece 2, a body of its own (cut_extrude12_pieces)
    add(part.part.solids().sort_by_distance((8.192079949, 0, -30.392629249))[0])


with BuildPart() as cut_extrude12_piece_3:
    # of the separate pieces the step leaves, piece 3, a body of its own (cut_extrude12_pieces)
    add(part.part.solids().sort_by_distance((-68.691961882, 0, -23.711158546))[0])


with BuildPart() as cut_extrude12_piece_4:
    # of the separate pieces the step leaves, piece 4, a body of its own (cut_extrude12_pieces)
    add(part.part.solids().sort_by_distance((-68.691961882, 0, 23.711158546))[0])


with BuildPart() as cut_extrude12_piece_5:
    # of the separate pieces the step leaves, piece 5, a body of its own (cut_extrude12_pieces)
    add(part.part.solids().sort_by_distance((43.885416553, 0, 22.74791587))[0])


with BuildPart() as cut_extrude12_piece_6:
    # of the separate pieces the step leaves, piece 6, a body of its own (cut_extrude12_pieces)
    add(part.part.solids().sort_by_distance((50.418811796, 0, -8.150402112))[0])


solid = Compound([cut_extrude12_piece_1.part, cut_extrude12_piece_2.part, cut_extrude12_piece_3.part, cut_extrude12_piece_4.part, cut_extrude12_piece_5.part, cut_extrude12_piece_6.part])
